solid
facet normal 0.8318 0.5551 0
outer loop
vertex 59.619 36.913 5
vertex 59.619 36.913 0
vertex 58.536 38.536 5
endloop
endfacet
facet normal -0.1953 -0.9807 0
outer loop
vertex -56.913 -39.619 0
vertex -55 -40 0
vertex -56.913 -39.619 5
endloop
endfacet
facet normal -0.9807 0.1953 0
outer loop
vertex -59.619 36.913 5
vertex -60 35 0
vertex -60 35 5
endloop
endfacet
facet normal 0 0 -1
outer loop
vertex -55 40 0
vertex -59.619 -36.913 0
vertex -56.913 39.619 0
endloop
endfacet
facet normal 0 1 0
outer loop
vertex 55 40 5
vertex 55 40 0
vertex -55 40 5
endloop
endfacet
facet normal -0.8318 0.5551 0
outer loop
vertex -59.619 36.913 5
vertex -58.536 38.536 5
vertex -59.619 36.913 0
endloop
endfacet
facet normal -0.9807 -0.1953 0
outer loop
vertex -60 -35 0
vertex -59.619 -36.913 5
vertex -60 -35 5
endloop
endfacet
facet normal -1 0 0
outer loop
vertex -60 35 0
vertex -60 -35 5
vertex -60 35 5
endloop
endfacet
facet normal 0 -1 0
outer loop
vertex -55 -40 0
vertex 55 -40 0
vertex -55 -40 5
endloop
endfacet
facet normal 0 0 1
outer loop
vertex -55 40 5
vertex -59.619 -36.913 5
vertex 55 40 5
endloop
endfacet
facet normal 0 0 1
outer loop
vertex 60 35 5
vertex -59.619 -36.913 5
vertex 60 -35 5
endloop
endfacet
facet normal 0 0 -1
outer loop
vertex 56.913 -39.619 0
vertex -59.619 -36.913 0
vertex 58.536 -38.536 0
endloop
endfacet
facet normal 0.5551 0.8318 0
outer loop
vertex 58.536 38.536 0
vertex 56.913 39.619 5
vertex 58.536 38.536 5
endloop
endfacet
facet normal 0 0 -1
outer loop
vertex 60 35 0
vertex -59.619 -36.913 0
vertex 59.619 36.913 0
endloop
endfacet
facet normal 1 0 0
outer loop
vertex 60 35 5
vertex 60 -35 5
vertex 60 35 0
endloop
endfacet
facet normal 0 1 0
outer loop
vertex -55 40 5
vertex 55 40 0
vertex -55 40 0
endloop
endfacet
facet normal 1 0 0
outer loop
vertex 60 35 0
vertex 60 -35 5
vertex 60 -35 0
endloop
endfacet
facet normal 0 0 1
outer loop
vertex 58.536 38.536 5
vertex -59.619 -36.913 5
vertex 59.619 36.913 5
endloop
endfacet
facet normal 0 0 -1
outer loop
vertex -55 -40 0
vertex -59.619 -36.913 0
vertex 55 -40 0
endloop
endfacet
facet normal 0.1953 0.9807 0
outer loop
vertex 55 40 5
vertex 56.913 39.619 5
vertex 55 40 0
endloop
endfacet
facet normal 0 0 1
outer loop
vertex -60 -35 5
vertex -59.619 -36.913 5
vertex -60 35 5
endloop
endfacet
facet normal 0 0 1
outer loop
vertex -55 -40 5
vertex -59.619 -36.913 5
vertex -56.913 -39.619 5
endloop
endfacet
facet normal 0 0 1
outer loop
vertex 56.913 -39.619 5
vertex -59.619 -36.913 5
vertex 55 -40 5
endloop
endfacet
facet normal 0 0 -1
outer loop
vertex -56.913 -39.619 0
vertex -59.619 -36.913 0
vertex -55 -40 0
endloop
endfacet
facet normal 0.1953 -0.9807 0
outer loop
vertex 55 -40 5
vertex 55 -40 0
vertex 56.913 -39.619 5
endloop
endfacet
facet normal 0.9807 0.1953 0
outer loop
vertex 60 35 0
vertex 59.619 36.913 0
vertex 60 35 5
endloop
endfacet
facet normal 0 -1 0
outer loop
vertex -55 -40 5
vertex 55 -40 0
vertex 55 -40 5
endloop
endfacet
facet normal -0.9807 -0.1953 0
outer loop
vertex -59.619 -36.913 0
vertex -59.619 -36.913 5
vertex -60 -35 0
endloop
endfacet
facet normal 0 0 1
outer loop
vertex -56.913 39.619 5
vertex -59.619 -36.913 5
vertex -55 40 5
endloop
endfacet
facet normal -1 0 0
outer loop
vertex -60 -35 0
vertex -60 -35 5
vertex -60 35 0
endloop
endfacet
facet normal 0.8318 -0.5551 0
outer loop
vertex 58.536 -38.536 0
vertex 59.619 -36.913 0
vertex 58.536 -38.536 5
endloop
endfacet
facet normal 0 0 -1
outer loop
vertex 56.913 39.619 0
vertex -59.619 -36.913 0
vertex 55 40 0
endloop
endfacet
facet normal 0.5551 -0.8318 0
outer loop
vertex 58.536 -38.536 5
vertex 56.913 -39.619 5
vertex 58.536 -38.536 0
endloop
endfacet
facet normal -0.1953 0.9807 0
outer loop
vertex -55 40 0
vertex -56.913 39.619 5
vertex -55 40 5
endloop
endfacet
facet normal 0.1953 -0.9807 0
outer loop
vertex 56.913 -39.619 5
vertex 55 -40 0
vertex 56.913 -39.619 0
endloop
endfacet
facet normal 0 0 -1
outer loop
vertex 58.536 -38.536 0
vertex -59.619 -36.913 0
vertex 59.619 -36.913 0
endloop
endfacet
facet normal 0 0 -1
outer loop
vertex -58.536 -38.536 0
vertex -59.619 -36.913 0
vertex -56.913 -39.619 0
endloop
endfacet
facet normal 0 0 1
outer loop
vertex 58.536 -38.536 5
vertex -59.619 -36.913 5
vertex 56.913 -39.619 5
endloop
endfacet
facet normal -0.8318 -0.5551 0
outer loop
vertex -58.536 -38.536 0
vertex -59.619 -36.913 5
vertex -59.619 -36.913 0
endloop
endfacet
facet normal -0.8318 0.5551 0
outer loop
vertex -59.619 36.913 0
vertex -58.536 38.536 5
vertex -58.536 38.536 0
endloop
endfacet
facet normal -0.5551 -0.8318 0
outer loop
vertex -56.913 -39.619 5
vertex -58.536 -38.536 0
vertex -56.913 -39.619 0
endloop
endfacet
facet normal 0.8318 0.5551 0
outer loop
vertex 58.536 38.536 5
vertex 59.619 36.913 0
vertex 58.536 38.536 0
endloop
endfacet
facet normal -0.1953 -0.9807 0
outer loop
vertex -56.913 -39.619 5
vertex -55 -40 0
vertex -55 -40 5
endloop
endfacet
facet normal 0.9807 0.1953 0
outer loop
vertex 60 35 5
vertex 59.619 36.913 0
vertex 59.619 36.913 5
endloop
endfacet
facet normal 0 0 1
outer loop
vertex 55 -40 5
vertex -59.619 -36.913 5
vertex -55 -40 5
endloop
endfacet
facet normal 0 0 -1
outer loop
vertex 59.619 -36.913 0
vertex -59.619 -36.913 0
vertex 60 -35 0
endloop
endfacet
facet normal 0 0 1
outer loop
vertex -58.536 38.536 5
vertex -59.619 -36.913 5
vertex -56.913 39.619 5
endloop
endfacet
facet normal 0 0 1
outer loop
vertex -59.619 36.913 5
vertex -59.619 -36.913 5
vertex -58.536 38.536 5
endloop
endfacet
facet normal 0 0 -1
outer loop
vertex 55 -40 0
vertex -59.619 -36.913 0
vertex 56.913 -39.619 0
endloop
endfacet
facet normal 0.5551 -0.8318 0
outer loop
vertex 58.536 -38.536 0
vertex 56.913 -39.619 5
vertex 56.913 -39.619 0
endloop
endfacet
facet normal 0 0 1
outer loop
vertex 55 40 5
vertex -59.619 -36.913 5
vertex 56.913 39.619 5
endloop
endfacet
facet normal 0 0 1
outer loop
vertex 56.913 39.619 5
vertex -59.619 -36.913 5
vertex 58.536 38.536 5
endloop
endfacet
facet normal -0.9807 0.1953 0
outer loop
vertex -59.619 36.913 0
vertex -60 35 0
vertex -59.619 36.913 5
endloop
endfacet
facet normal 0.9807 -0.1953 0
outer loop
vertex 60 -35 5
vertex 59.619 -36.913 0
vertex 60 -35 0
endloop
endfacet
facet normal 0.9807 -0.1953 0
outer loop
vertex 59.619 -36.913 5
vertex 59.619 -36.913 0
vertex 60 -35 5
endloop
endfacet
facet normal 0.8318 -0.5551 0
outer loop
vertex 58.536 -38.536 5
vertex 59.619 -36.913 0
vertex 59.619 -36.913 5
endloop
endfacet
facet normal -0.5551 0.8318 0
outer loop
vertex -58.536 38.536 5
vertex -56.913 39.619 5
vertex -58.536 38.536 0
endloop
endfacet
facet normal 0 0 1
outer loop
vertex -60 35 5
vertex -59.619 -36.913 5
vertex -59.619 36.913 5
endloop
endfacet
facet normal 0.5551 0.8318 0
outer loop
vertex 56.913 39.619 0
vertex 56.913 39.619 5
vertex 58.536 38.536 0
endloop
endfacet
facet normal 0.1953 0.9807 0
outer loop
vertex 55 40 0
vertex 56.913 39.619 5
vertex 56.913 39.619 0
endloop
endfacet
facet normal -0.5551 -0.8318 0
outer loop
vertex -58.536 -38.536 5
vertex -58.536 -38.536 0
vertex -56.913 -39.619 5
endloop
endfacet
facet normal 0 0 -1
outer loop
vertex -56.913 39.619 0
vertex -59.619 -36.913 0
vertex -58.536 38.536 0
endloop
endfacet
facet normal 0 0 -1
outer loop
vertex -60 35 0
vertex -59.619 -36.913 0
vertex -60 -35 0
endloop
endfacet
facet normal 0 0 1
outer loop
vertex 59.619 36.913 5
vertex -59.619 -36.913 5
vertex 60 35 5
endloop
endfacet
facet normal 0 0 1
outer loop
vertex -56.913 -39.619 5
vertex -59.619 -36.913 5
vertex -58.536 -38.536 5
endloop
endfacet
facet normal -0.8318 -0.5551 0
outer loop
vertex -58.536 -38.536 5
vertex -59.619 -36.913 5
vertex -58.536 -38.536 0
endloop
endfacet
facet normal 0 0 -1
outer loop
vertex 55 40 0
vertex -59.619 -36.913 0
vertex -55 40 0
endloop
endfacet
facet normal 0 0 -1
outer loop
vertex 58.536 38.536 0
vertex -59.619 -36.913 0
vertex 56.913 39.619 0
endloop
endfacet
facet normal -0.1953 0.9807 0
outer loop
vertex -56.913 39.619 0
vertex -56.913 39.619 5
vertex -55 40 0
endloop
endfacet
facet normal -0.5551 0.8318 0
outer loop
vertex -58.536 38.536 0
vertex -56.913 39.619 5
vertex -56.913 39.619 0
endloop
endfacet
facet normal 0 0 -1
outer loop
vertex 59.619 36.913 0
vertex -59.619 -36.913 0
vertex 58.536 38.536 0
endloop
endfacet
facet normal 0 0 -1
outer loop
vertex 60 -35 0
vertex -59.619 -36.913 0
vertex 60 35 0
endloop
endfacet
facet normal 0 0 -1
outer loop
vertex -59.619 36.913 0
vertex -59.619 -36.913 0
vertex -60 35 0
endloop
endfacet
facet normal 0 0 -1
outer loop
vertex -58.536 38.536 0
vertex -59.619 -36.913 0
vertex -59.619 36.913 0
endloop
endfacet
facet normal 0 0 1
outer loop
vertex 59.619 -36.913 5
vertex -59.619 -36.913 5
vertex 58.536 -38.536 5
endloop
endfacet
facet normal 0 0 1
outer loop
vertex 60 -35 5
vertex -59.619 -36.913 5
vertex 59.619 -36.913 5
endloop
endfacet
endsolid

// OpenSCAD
/*
 * Project:     RoundedPlate.scad
 * Version:     1.0
 * Author:      Reinhard Loch
 * Copyright:   2024
 * License:     2-clause BSD License
 *              (http://opensource.org/licenses/BSD-2-Clause)
 */


/* [Plate Dimensions] */

// Height
h = 5; // [10:200]

// Width
w = 120; // [10:250]

// Depth
d = 80; // [10:250]

// Radius
r = 5; // [1:10]


module RoundedPlate(h = h, w = w, d = d, r = r ) {

translate([-w/2 + r, -d/2 + r, 0])

    minkowski() {
        cube([w - 2*r, d - 2*r, h/2]);
        cylinder(h = h/2, r = r);
    };
    
};

RoundedPlate();
